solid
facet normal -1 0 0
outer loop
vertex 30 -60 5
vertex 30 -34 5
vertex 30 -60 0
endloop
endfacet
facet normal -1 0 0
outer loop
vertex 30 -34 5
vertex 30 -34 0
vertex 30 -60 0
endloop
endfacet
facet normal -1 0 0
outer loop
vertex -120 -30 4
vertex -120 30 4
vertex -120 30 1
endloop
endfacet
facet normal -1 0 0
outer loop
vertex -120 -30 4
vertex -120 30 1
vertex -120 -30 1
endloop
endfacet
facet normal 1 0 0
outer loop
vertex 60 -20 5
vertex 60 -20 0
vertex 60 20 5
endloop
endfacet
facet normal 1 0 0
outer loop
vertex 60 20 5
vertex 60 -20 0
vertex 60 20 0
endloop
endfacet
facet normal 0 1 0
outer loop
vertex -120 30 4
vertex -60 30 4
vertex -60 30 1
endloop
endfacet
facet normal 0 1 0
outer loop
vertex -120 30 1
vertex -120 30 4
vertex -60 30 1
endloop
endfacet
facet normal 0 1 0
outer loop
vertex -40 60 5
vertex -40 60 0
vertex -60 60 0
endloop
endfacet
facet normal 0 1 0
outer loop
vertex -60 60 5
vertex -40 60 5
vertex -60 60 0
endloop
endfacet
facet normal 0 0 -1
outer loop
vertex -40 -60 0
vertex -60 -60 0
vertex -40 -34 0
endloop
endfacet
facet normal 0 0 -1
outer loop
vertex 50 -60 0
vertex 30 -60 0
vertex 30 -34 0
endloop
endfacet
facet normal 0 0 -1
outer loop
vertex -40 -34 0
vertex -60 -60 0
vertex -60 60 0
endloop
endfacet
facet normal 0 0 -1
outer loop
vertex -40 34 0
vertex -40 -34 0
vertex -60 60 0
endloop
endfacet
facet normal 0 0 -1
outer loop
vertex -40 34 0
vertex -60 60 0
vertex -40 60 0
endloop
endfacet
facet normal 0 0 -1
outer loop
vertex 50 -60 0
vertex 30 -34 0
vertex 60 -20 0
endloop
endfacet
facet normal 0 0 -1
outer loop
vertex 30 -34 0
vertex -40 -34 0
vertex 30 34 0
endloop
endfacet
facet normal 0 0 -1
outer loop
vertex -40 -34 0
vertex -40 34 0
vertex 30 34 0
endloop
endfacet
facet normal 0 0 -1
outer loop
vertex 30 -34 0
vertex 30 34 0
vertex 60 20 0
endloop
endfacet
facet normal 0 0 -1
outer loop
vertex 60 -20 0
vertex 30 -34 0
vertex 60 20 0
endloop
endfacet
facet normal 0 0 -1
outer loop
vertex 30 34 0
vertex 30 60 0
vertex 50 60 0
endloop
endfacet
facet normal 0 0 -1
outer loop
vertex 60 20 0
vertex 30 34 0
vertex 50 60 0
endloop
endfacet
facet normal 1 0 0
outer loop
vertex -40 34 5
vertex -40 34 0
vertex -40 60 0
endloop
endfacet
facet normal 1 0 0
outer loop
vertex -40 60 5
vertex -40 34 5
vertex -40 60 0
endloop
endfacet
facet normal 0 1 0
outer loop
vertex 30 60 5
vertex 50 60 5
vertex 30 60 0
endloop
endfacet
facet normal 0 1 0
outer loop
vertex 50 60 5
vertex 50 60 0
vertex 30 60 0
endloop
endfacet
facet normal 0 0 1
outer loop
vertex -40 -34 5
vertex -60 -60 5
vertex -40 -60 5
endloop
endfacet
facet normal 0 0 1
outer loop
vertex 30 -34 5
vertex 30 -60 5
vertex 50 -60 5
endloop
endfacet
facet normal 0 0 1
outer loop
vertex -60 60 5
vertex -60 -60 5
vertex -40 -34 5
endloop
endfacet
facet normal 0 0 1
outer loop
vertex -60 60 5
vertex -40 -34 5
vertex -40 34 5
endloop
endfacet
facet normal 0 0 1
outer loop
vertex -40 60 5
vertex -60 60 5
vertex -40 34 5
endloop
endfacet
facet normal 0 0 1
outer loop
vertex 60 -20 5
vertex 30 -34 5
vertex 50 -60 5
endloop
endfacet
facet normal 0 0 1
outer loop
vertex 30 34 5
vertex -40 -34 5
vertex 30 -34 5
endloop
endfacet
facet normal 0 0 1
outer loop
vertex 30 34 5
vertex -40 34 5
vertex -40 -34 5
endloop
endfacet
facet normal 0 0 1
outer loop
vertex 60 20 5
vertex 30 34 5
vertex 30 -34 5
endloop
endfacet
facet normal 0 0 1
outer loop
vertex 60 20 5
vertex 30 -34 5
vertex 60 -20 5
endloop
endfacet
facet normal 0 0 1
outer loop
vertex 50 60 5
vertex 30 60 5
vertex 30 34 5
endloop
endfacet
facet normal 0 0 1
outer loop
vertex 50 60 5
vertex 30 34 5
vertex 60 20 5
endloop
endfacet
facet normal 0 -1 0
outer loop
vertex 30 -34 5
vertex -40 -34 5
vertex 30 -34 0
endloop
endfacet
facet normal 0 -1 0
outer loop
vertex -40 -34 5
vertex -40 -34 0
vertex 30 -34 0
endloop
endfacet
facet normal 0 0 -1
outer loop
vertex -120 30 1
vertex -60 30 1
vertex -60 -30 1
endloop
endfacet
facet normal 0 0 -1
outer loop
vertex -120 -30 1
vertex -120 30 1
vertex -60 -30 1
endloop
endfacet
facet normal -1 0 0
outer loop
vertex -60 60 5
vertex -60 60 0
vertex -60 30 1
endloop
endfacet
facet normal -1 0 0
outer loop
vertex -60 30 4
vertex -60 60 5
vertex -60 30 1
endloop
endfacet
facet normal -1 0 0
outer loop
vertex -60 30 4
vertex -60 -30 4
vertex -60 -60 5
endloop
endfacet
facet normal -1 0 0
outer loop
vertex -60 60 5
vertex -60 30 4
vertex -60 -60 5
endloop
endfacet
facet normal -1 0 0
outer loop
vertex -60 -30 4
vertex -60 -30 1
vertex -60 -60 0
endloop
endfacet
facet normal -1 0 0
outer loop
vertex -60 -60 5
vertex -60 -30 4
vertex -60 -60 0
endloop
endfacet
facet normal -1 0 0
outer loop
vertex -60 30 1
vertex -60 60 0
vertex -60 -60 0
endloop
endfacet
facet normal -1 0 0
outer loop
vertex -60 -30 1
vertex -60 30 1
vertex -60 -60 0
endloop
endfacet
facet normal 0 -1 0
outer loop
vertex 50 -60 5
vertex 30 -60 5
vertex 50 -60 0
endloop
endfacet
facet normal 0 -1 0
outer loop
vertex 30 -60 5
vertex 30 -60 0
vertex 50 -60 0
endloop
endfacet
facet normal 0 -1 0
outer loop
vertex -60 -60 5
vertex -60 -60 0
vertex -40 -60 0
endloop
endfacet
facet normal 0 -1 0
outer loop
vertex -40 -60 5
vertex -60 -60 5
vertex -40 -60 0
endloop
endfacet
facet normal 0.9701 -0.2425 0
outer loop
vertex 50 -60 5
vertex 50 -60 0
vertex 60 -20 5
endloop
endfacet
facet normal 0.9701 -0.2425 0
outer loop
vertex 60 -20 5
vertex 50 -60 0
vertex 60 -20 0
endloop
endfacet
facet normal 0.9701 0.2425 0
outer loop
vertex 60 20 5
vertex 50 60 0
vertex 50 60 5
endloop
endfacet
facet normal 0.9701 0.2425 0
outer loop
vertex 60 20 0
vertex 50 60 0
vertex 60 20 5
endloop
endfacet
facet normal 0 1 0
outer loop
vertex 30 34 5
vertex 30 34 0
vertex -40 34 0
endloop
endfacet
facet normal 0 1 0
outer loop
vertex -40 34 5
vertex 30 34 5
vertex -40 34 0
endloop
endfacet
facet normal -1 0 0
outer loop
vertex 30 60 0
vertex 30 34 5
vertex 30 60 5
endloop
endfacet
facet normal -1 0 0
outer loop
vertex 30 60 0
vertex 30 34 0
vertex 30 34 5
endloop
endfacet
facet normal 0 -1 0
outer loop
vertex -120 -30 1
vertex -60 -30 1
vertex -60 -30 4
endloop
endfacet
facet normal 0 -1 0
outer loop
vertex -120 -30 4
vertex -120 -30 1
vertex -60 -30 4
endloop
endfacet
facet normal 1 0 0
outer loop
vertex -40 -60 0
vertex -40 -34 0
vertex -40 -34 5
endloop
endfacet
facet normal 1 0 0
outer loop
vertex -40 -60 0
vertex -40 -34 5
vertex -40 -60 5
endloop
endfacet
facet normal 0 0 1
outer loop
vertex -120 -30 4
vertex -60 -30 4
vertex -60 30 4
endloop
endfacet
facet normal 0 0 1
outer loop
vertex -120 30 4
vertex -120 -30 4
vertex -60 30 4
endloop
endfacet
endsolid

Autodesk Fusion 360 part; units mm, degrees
sketch "Bottom back base" plane through (0, 0, 0) normal (0, 0, 1) x (1, 0, 0)
  line L0 (-60, 60) -> (-60, -60)
  line L1 (60, -20) -> (60, 20)
  line L2 (-60, 0) -> (-57.5, 0) construction
  line L3 (-57.5, -60) -> (-57.5, -6) construction
  line L4 (-57.5, -6) -> (12.5, -6) construction
  line L5 (12.5, -6) -> (12.5, -34) construction
  line L6 (12.5, -34) -> (30, -34)
  line L7 (30, -34) -> (12.5, -34)
  line L8 (12.5, -34) -> (-40, -34)
  line L9 (-40, -34) -> (-40, -60)
  line L10 (30, -34) -> (30, -60)
  line L11 (-40, 34) -> (-40, 60)
  line L12 (12.5, 34) -> (-40, 34)
  line L13 (12.5, 34) -> (30, 34)
  line L14 (30, 34) -> (30, 60)
  line L15 (50, -60) -> (60, -20)
  line L16 (50, 60) -> (60, 20)
  line L17 (50, 60) -> (30, 60)
  line L18 (-40, 60) -> (-60, 60)
  line L19 (-60, -60) -> (-40, -60)
  line L20 (30, -60) -> (50, -60)
  point P0 (60, 60)
  point P1 (60, -60)
  dimension "d1" = 120
  dimension "d2" = 120
  dimension "d3" = 2.5
  dimension "d4" = 54
  dimension "d5" = 70
  dimension "d6" = 28
  dimension "d8" = 70
  dimension "d9" = 10
  dimension "d10" = 40
  dimension "d11" = 10
  dimension "d12" = 40
extrude "Bottom back height" add sketch "Bottom back base" along normal blind 5
sketch "Connector" plane through (-60, 0, 0) normal (-1, 0, 0) x (0, -1, 0)
  line L0 (-60, 0) -> (60, 0)
  line L1 (60, 0) -> (60, 5)
  line L2 (60, 5) -> (-60, 5)
  line L3 (-60, 5) -> (-60, 0)
  line L4 (0, 0) -> (0, 5) construction
  line L5 (30, 4) -> (-30, 4)
  line L6 (-30, 4) -> (-30, 1)
  line L7 (-30, 1) -> (30, 1)
  line L8 (30, 1) -> (30, 4)
  line L9 (30, 4) -> (-30, 1) construction
  line L10 (-30, 4) -> (30, 1) construction
  point P0 (0, 2.5)
  dimension "d15" = 3
  dimension "d16" = 60
extrude "Connector width" add sketch "Connector" along normal blind 60 contours L5 L6 L7 L8
equation "d6 = 54 mm - 26 mm"
